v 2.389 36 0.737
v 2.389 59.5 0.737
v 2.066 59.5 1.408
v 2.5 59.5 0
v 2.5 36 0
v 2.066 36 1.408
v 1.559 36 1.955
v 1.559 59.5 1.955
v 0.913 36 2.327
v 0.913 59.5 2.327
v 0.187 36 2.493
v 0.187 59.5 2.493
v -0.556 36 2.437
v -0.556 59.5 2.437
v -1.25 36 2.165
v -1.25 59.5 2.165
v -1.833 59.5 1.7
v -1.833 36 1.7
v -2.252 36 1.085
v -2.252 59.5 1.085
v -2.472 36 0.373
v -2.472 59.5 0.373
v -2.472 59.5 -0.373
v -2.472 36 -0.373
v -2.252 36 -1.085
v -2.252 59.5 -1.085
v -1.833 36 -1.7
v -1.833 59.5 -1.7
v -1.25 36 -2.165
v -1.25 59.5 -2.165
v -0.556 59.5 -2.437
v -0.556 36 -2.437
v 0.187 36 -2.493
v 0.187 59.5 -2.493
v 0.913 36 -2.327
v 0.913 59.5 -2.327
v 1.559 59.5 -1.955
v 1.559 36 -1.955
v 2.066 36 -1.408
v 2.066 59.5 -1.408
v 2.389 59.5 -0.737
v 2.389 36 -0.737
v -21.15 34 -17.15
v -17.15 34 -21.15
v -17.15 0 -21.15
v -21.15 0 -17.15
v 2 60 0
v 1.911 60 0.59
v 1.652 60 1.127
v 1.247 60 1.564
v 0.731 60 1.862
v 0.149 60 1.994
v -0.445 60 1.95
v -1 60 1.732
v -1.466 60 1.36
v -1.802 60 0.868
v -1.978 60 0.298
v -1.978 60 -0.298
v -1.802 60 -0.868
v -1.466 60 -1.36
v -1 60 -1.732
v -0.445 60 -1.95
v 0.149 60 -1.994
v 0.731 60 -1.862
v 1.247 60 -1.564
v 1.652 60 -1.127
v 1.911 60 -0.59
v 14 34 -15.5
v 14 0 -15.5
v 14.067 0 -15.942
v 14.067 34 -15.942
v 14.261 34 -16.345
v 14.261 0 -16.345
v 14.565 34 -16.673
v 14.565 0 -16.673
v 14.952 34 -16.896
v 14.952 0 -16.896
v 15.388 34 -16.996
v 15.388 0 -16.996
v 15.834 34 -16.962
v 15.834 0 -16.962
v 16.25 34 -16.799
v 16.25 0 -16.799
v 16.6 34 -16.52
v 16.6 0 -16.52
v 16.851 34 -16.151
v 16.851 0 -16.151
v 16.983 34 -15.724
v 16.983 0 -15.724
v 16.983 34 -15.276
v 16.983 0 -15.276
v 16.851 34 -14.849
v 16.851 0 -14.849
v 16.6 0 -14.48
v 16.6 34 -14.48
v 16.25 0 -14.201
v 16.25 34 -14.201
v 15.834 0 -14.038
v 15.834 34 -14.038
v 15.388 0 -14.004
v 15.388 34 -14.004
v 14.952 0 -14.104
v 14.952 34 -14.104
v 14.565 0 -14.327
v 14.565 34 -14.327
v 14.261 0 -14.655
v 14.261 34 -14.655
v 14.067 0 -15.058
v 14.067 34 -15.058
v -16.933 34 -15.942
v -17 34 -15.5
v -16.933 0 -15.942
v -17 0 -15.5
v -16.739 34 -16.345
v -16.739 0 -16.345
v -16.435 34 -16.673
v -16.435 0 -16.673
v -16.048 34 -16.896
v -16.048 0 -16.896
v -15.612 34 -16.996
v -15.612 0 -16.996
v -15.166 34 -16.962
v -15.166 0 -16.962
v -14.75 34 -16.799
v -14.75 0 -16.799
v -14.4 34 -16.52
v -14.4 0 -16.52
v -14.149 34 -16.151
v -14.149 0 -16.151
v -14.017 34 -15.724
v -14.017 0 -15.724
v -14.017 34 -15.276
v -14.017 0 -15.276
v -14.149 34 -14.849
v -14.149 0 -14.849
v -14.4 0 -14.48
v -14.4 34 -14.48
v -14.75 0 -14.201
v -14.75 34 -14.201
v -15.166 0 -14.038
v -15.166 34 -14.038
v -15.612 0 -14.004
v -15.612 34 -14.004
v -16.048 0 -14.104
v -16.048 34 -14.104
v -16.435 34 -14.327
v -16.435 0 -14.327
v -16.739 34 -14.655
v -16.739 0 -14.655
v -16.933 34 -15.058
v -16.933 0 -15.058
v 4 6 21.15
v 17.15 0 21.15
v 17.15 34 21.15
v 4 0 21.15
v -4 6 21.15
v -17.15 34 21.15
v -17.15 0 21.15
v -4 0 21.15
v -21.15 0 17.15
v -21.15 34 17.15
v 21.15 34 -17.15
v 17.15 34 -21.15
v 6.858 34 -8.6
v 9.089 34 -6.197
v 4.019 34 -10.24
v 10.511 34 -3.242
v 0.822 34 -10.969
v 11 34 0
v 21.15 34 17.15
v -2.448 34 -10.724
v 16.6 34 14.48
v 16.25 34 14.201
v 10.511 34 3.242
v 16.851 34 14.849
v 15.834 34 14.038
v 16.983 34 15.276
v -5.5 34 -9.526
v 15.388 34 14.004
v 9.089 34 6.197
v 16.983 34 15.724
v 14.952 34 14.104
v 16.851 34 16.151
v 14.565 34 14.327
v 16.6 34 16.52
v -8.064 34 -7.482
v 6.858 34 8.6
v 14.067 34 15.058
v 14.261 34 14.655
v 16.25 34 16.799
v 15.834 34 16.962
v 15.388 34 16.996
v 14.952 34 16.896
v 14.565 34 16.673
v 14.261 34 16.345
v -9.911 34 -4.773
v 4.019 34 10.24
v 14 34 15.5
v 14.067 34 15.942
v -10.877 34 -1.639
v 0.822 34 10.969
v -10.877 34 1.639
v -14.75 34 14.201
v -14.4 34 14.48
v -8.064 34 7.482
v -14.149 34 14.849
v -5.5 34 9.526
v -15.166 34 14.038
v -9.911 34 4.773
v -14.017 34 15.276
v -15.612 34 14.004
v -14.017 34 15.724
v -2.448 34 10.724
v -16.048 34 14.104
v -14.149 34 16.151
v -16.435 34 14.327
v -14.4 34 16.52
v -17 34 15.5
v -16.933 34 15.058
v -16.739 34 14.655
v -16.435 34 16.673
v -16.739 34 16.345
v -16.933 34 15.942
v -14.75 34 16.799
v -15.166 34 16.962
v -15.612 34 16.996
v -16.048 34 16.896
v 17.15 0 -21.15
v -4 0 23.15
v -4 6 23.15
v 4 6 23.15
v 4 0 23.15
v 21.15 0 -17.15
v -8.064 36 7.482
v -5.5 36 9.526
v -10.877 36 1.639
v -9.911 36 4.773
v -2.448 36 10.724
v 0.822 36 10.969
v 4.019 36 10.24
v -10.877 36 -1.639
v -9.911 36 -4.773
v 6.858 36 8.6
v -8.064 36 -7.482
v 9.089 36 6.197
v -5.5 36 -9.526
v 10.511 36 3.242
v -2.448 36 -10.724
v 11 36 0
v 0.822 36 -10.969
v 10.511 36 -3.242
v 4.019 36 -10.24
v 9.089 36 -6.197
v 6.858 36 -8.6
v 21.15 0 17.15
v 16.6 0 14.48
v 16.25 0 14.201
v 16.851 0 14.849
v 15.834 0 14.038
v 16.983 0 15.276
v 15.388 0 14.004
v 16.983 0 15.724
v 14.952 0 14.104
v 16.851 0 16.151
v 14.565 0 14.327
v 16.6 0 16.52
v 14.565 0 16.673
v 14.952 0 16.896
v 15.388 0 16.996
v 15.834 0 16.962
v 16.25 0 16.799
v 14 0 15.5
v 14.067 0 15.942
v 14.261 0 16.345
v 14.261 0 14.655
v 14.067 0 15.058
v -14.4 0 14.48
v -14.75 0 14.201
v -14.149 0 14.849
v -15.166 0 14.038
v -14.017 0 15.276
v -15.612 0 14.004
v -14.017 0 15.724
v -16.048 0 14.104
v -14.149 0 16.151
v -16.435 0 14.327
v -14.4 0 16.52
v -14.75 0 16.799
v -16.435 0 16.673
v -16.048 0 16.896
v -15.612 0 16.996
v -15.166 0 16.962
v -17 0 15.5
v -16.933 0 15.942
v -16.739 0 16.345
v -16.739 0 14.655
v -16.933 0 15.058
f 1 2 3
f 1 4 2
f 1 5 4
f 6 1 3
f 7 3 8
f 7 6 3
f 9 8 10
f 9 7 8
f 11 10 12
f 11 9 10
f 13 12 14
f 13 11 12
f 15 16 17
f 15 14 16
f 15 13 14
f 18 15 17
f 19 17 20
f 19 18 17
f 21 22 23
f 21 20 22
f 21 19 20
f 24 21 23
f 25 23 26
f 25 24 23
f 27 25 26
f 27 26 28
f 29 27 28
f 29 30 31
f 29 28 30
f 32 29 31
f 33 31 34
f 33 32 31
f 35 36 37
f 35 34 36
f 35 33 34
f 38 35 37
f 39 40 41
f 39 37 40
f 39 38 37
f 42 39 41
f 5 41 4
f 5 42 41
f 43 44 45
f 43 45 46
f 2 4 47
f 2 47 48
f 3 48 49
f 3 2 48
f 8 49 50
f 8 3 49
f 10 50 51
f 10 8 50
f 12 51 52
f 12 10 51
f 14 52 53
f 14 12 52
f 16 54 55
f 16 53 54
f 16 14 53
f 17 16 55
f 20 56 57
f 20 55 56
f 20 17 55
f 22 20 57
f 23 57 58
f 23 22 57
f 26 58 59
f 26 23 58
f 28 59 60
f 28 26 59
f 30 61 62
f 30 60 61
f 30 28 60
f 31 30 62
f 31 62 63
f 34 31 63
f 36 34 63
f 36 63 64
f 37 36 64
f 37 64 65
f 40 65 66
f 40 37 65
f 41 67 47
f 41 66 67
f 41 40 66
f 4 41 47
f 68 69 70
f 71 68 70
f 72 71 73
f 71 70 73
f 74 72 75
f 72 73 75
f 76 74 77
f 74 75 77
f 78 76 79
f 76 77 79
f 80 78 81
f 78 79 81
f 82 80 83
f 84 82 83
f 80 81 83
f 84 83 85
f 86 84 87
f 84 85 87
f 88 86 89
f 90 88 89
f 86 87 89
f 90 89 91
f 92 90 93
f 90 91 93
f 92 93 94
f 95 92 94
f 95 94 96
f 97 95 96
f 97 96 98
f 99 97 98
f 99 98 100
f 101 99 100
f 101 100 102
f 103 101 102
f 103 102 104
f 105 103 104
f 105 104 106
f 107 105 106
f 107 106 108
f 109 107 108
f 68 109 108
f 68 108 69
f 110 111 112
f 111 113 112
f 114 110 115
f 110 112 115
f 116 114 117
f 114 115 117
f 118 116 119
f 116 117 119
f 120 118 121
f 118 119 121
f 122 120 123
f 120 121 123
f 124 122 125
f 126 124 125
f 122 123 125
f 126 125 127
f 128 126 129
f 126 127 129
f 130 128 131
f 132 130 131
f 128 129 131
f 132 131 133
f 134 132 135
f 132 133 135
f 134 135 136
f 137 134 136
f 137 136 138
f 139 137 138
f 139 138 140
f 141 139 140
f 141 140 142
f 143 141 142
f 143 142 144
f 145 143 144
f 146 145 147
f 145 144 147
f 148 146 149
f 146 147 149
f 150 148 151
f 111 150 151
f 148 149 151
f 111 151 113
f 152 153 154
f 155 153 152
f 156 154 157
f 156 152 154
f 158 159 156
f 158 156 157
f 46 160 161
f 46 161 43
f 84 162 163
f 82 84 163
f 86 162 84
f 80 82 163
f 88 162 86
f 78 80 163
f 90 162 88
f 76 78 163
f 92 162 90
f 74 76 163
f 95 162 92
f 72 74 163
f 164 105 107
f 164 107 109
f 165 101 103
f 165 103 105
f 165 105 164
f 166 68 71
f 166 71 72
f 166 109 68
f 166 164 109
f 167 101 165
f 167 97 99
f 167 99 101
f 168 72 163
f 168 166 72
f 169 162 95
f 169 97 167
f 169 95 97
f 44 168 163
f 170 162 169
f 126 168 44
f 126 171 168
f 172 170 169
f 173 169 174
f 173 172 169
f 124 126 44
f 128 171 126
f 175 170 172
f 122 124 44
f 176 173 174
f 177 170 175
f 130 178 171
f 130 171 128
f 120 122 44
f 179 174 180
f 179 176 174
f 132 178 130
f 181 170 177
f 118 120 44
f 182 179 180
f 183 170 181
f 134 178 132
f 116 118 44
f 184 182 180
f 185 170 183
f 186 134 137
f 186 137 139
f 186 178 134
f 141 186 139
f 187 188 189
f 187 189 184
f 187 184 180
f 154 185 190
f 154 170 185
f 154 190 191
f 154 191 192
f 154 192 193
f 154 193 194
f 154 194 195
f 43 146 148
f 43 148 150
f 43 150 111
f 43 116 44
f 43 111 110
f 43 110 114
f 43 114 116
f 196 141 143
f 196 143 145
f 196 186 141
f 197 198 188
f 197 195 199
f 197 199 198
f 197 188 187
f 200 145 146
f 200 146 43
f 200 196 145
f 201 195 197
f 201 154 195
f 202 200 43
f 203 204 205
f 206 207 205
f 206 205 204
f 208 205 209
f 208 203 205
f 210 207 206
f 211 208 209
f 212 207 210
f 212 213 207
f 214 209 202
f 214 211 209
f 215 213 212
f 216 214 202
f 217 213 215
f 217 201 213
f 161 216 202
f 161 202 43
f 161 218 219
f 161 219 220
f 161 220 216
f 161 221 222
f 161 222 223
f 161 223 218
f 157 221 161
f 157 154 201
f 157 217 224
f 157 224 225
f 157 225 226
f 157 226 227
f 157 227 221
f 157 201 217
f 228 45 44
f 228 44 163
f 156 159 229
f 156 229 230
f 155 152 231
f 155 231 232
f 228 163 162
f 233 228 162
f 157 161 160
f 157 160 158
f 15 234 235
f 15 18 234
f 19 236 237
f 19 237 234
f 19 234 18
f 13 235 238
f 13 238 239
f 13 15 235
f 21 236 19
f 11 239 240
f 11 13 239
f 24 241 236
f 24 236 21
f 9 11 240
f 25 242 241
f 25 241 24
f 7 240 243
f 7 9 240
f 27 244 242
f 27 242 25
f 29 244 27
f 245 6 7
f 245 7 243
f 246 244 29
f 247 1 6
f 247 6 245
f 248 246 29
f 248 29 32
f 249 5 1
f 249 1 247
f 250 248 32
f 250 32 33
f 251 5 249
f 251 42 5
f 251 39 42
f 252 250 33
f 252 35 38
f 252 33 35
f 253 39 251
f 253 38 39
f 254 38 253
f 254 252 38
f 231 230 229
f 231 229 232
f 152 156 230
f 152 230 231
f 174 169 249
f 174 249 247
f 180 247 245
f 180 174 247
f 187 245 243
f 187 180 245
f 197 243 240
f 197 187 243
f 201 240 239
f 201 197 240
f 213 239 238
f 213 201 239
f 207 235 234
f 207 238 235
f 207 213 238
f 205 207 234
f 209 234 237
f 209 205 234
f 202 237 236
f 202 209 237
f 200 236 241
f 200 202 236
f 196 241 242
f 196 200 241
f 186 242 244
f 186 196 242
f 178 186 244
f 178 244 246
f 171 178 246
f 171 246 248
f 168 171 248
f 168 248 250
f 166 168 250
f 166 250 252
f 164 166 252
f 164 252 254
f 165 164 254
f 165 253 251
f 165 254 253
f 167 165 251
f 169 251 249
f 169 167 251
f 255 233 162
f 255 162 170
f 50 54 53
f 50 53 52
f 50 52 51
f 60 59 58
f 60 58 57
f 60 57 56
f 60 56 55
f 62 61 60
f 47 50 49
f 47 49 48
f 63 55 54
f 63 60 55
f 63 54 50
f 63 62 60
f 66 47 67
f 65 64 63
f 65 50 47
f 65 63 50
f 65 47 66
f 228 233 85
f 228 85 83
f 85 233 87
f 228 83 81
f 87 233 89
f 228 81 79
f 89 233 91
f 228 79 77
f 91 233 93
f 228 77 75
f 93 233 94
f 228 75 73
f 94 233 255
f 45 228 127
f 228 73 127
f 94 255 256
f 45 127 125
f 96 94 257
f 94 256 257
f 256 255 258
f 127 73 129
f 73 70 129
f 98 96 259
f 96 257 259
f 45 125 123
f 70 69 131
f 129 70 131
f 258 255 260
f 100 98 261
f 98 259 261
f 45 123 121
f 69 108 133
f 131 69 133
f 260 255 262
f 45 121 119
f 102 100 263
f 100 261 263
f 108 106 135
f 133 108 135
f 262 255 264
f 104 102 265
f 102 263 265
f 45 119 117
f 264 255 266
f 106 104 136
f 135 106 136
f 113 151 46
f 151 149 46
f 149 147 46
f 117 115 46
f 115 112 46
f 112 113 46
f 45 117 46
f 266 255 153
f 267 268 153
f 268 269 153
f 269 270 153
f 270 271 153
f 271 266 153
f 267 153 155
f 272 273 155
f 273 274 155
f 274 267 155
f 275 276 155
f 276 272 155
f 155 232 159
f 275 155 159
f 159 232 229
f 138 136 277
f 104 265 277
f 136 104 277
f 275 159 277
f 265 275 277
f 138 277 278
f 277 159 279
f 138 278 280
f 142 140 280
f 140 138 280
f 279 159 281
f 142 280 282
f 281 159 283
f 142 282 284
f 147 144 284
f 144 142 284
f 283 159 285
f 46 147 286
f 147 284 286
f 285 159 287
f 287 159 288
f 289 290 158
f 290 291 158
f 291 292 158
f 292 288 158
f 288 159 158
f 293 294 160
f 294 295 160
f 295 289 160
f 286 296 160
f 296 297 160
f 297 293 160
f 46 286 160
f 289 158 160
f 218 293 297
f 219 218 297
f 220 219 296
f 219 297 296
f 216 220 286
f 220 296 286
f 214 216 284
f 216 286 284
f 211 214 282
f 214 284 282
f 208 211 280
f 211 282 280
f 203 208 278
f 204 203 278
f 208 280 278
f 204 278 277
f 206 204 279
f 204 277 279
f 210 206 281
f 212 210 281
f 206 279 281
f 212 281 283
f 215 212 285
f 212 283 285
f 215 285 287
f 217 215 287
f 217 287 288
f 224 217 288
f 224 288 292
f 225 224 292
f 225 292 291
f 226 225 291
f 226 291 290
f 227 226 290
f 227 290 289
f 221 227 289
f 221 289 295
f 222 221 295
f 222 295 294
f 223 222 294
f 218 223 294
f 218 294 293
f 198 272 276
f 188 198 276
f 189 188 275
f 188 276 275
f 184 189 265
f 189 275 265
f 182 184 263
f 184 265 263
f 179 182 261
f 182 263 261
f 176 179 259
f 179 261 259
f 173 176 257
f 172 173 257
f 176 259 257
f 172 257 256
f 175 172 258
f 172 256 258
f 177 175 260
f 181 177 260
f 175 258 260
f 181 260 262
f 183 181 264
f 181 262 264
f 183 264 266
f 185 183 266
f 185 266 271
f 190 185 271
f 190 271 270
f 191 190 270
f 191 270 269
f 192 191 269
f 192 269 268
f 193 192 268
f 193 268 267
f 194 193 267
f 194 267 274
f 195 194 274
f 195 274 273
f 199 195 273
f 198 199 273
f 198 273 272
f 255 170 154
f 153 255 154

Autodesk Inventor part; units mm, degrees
ref_plane "YZ Plane" through (0, 0, 0) normal (1, 0, 0) x (0, 1, 0)
ref_plane "XZ Plane" through (0, 0, 0) normal (0, 1, 0) x (-1, 0, 0)
ref_plane "XY Plane" through (0, 0, 0) normal (0, 0, 1) x (1, 0, 0)
sketch "Sketch1" plane through (0, 0, 0) normal (0, 1, 0) x (-1, 0, 0)
  line L0 (-17.15, 21.15) -> (17.15, 21.15)
  line L1 (21.15, 17.15) -> (21.15, -17.15)
  line L2 (17.15, -21.15) -> (-17.15, -21.15)
  line L3 (-21.15, -17.15) -> (-21.15, 17.15)
  line L4 (-21.15, 21.15) -> (21.15, -21.15) construction
  line L5 (21.15, 21.15) -> (-21.15, -21.15) construction
  line L6 (-15.5, 15.5) -> (15.5, 15.5)
  line L7 (15.5, 15.5) -> (15.5, -15.5)
  line L8 (15.5, -15.5) -> (-15.5, -15.5)
  line L9 (-15.5, -15.5) -> (-15.5, 15.5)
  line L10 (-15.5, 15.5) -> (15.5, -15.5) construction
  line L11 (15.5, 15.5) -> (-15.5, -15.5) construction
  circle A0 centre (15.5, 15.5) radius 1.5
  circle A1 centre (-15.5, 15.5) radius 1.5
  circle A2 centre (15.5, -15.5) radius 1.5
  circle A3 centre (-15.5, -15.5) radius 1.5
  line L12 (21.15, 17.15) -> (17.15, 21.15)
  line L13 (-21.15, 17.15) -> (-17.15, 21.15)
  line L14 (-17.15, -21.15) -> (-21.15, -17.15)
  line L15 (17.15, -21.15) -> (21.15, -17.15)
  point P0 (0, 0)
  dimension "d0" = 42.3
  dimension "d1" = 42.3
  dimension "d2" = 31
  dimension "d3" = 31
  dimension "d4" = 3
  dimension "d7" = 31
  dimension "d10" = 31
  dimension "d13" = 4
  dimension "d14" = 4
  dimension "d15" = 4
  dimension "d16" = 4
  dimension "d17" = 4
  dimension "d18" = 4
  dimension "d19" = 4
  dimension "d20" = 4
extrude "Extrusion1" add sketch "Sketch1" along normal blind 34 contours L0 L12 L1 L15 L2 L14 L3 L13 | L6 A0 L7 A2 L8 A3 L9 A1
sketch "Sketch2" plane through (0, 34, 0) normal (0, 1, 0) x (1, 0, 0)
  circle A0 centre (0, 0) radius 11
  dimension "d23" = 22
extrude "Extrusion2" add sketch "Sketch2" along normal blind 2
sketch "Sketch3" plane through (0, 36, 0) normal (0, 1, 0) x (1, 0, 0)
  circle A0 centre (0, 0) radius 2.5
  dimension "d26" = 5
extrude "Extrusion3" add sketch "Sketch3" along normal blind 24
chamfer "Chamfer1" distance 0.5 angle 45 1 edges at (-2.5, 60, 0)
sketch "Sketch4" plane through (-17.15, 0, 21.15) normal (0, 0, 1) x (1, 0, 0)
  line L0 (13.15, 0) -> (21.15, 0)
  line L1 (0, 0) -> (34.3, 0) projected
  line L2 (21.15, 0) -> (13.15, 0)
  line L3 (13.15, 0) -> (13.15, 6)
  line L4 (13.15, 6) -> (21.15, 6)
  line L5 (21.15, 6) -> (21.15, 0)
  point P0 (17.15, 0)
  dimension "d32" = 8
  dimension "d33" = 8
  dimension "d34" = 6
extrude "Extrusion4" add sketch "Sketch4" along normal blind 2
equation "\"d14\" = d13"
equation "\"d15\" = d13"
equation "\"d16\" = d15"
equation "\"d17\" = d13"
equation "\"d18\" = d17"
equation "\"d19\" = d13"
equation "\"d20\" = d19"
properties part number "Stepper_motor"
